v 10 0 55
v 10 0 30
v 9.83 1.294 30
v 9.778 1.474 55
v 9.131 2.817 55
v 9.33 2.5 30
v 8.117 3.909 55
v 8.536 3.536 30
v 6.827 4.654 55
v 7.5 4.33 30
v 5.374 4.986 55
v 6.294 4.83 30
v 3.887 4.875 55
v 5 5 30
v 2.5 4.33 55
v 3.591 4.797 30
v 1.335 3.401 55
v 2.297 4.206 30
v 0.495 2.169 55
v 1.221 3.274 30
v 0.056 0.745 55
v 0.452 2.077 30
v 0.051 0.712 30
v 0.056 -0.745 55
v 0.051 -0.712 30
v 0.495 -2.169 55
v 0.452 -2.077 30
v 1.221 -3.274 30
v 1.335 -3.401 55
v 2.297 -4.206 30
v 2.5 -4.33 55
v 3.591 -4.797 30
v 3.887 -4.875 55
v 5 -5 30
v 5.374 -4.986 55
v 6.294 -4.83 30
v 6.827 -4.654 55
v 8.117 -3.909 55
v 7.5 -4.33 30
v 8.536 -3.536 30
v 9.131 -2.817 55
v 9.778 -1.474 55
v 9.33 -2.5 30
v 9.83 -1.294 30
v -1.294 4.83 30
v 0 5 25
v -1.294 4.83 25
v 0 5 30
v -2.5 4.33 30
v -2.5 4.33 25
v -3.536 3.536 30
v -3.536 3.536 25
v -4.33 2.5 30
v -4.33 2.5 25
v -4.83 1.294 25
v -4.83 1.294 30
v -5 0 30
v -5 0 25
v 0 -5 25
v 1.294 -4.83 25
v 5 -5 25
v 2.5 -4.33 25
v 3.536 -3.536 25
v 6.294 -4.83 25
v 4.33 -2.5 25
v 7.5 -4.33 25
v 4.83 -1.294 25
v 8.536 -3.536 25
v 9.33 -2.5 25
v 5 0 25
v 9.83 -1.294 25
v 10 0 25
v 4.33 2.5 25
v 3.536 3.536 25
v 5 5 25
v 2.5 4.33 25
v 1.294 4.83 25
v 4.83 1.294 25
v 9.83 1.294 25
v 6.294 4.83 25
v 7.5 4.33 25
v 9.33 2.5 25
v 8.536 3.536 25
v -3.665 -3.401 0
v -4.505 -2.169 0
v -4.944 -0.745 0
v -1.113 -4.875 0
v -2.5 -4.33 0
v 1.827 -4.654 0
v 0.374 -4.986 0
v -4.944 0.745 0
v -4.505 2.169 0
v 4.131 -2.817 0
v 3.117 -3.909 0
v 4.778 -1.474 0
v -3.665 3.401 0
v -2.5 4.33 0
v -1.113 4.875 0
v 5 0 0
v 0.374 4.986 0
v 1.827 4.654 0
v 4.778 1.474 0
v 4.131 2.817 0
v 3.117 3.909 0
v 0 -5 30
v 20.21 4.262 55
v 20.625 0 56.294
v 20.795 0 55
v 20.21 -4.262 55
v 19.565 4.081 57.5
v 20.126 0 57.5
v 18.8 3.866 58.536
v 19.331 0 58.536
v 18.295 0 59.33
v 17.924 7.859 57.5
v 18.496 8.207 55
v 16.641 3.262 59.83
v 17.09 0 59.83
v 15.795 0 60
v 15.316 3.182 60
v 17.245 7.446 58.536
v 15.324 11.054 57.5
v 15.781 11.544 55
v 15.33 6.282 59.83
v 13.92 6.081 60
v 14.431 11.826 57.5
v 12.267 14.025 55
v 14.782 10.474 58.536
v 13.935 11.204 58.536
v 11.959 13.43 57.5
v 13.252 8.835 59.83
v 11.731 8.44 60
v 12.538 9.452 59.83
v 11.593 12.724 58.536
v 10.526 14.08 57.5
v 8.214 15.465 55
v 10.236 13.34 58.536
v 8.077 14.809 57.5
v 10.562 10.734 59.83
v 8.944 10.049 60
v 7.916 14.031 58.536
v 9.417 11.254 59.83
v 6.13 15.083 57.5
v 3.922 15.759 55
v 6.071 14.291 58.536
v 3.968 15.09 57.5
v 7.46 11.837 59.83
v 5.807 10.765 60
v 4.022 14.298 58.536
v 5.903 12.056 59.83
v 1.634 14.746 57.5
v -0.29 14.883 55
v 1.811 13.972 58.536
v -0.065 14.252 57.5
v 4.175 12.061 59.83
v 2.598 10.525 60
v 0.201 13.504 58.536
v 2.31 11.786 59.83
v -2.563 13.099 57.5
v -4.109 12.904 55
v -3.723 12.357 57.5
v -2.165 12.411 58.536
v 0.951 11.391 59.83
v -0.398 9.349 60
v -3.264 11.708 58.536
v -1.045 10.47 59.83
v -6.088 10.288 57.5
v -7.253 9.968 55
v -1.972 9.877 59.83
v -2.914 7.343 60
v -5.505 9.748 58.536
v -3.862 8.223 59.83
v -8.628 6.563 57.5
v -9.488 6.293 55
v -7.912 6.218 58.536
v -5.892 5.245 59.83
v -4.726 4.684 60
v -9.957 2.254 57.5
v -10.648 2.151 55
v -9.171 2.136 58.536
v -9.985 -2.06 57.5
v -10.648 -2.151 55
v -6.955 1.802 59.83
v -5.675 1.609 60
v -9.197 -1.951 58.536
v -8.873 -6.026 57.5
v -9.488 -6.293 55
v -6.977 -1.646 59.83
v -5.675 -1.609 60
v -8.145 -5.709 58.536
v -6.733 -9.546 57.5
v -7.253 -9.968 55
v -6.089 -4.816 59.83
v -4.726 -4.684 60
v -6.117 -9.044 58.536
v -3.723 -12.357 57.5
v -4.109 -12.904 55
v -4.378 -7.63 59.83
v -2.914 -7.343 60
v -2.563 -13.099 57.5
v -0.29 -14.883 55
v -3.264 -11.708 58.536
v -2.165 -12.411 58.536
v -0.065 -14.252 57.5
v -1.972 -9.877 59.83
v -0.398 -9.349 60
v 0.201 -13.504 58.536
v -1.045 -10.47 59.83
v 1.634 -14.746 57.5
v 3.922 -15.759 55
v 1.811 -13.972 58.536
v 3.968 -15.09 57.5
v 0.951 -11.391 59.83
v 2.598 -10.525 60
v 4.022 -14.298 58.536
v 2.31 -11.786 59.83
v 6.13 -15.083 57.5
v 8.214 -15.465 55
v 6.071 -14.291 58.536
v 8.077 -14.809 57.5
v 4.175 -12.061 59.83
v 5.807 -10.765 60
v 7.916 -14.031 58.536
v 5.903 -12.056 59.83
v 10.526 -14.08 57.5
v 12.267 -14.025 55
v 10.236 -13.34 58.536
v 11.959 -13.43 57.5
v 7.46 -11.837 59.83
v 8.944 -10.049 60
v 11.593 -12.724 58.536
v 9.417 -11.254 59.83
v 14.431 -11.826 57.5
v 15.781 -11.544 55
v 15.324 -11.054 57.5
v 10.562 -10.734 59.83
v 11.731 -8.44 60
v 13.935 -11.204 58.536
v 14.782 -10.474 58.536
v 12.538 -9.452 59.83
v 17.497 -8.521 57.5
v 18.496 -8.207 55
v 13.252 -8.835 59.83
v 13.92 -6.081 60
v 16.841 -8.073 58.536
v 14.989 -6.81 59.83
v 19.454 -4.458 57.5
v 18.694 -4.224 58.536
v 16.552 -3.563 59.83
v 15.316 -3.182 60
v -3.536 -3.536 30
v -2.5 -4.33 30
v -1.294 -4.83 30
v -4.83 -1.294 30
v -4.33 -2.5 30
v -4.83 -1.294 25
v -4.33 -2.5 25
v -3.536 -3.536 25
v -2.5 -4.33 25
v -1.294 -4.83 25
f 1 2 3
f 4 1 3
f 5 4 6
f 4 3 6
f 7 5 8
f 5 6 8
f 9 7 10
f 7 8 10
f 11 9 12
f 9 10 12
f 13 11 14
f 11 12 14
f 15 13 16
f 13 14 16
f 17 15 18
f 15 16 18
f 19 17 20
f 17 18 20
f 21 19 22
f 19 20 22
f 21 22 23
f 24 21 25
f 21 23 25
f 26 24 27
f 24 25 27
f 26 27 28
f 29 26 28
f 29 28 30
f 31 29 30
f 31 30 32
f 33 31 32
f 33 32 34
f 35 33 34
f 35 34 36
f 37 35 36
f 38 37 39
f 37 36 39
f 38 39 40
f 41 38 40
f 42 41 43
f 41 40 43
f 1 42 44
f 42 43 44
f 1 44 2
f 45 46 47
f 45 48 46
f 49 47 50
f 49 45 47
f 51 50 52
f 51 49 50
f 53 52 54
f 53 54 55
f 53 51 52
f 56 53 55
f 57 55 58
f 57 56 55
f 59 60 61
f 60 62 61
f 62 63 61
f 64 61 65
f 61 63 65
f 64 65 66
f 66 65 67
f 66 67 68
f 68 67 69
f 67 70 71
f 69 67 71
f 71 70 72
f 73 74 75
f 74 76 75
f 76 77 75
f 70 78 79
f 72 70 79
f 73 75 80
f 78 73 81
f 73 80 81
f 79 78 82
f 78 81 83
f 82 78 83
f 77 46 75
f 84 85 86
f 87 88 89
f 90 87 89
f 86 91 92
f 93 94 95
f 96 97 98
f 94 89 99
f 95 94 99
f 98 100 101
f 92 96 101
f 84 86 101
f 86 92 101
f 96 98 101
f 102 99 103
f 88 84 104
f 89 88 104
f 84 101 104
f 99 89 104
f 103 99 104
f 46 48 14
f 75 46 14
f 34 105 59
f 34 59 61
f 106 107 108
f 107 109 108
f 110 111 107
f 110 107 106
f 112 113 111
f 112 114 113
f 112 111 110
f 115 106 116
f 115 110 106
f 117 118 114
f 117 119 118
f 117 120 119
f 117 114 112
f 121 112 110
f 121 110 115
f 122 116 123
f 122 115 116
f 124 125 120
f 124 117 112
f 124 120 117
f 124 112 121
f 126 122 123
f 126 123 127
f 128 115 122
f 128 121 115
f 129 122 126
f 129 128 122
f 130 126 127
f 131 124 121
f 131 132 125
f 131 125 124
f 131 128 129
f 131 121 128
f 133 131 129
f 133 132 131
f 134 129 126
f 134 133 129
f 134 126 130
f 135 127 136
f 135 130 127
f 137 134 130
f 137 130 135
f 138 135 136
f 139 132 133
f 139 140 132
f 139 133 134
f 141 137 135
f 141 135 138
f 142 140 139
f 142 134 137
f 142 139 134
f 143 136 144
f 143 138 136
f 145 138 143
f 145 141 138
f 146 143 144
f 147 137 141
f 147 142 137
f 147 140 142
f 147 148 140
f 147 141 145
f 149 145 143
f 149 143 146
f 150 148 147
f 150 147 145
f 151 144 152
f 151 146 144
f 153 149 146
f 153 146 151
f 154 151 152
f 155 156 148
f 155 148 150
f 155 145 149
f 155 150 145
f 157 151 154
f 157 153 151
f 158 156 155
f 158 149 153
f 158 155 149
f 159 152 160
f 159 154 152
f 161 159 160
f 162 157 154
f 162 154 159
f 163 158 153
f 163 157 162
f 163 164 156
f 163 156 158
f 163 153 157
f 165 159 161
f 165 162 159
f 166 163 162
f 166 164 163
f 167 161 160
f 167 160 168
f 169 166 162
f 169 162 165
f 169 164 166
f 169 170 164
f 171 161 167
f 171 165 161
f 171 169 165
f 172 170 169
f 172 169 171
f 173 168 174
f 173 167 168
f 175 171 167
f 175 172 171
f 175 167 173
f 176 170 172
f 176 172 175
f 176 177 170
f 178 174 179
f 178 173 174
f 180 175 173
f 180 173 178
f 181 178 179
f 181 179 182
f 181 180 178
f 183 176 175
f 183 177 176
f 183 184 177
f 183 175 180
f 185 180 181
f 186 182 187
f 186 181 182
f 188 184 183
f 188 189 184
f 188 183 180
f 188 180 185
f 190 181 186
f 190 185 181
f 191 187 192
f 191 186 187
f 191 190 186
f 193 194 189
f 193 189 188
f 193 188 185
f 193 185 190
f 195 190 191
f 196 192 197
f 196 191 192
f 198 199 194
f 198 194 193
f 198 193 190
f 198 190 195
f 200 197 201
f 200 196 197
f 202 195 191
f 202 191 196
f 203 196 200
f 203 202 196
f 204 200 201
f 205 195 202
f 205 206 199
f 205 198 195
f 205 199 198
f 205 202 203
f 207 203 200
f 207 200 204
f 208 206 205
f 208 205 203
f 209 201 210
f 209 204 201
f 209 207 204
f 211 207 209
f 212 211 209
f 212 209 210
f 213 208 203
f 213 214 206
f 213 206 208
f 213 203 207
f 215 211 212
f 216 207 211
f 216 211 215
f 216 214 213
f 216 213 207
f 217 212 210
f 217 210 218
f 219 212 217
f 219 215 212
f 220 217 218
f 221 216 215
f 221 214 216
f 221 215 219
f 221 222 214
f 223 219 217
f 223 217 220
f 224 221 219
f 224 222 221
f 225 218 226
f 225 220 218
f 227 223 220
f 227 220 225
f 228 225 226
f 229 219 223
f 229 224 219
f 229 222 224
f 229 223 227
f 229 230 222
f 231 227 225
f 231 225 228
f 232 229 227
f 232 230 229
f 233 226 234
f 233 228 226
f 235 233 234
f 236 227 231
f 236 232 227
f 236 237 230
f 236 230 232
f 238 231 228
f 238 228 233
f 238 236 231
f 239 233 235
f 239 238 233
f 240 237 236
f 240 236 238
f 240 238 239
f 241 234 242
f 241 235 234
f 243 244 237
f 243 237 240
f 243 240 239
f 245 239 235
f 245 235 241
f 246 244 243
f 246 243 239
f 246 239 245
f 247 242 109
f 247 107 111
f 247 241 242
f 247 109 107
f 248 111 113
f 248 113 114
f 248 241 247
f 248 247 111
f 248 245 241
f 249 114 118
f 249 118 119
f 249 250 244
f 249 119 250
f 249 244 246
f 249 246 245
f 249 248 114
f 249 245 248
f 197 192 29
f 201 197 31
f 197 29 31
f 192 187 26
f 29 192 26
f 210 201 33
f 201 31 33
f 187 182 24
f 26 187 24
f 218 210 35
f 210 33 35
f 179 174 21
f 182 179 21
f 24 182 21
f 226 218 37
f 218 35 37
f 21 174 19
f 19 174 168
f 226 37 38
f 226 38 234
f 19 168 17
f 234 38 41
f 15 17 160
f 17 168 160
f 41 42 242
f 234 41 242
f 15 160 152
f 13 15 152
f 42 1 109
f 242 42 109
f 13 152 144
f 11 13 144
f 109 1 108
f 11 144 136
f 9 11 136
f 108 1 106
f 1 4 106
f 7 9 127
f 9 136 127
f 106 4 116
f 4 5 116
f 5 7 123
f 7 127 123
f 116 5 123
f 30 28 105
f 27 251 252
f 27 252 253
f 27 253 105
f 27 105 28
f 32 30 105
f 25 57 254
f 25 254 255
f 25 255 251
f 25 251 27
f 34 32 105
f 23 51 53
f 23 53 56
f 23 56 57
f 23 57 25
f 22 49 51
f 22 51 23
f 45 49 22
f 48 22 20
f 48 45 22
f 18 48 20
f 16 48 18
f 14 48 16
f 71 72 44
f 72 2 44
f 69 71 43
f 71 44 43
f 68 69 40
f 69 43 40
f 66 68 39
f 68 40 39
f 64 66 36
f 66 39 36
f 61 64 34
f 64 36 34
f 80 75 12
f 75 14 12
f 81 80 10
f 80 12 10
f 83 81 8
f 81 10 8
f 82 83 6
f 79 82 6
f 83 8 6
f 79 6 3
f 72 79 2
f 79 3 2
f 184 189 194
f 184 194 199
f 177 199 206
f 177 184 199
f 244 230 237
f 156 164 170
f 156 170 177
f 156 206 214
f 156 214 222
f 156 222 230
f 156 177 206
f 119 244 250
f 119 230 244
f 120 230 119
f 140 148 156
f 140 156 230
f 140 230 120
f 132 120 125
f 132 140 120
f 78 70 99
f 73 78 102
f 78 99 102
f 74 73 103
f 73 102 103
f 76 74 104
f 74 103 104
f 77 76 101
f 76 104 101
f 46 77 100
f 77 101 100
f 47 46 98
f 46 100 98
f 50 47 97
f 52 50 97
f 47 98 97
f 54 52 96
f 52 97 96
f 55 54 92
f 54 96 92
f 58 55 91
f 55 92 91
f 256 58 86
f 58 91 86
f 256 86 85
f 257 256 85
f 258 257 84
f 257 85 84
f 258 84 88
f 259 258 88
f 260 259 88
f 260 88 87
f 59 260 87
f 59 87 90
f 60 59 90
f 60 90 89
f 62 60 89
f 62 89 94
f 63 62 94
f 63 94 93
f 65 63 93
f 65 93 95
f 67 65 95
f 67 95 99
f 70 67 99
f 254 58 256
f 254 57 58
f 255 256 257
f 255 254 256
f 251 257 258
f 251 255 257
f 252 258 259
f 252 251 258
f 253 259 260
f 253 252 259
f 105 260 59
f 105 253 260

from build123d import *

# Parameters (mm, degrees)
F0_R     = 5
F1_DEPTH = 25
F2_W     = 15
F2_H     = 10
F3_DEPTH = 5
F4_R     = 5
F5_DEPTH = 25
F6_R     = 4.9999
F7_R     = 15.7954316655
F8_DEPTH = 5
F9_R     = 4.99999


# Not quite as in the source:
# - a fillet or chamfer is up to 0.001 mm smaller than in the source, because OpenCascade refuses the exact size


with BuildPart() as f1:
    # F0 (on Top) → F1 (new body)
    with BuildSketch(Plane.XY):
        Circle(F0_R)
    extrude(amount=F1_DEPTH)

    # F2 (on face) → F3 (join)
    with BuildSketch(Plane.XY.offset(25)):
        with Locations((2.5, 0)):
            Rectangle(F2_W, F2_H)
    extrude(amount=F3_DEPTH)

    # F4 (on face) → F5 (join)
    with BuildSketch(Plane.XY.offset(30)):
        with Locations((5, 0)):
            Circle(F4_R)
    extrude(amount=F5_DEPTH)

    # F6 (radius 5 in the source; OpenCascade refuses exactly that, so slightly less here)
    f6_edges = [f1.edges().sort_by_distance(p)[0] for p in [
        (10, -5, 27.5),
        (10, 5, 27.5),
        (-5, 5, 27.5),
        (-5, -5, 27.5),
    ]]
    fillet(f6_edges, radius=F6_R)

    # F7 (on face) → F8 (join)
    with BuildSketch(Plane.XY.offset(55)):
        with Locations((5, 0)):
            Circle(F7_R)
    extrude(amount=F8_DEPTH)

    # F9 (radius 5 in the source; OpenCascade refuses exactly that, so slightly less here)
    f9_edges = [f1.edges().sort_by_distance(p)[0] for p in [
        (-10.795432, 0, 60),
    ]]
    fillet(f9_edges, radius=F9_R)


solid = f1.part
